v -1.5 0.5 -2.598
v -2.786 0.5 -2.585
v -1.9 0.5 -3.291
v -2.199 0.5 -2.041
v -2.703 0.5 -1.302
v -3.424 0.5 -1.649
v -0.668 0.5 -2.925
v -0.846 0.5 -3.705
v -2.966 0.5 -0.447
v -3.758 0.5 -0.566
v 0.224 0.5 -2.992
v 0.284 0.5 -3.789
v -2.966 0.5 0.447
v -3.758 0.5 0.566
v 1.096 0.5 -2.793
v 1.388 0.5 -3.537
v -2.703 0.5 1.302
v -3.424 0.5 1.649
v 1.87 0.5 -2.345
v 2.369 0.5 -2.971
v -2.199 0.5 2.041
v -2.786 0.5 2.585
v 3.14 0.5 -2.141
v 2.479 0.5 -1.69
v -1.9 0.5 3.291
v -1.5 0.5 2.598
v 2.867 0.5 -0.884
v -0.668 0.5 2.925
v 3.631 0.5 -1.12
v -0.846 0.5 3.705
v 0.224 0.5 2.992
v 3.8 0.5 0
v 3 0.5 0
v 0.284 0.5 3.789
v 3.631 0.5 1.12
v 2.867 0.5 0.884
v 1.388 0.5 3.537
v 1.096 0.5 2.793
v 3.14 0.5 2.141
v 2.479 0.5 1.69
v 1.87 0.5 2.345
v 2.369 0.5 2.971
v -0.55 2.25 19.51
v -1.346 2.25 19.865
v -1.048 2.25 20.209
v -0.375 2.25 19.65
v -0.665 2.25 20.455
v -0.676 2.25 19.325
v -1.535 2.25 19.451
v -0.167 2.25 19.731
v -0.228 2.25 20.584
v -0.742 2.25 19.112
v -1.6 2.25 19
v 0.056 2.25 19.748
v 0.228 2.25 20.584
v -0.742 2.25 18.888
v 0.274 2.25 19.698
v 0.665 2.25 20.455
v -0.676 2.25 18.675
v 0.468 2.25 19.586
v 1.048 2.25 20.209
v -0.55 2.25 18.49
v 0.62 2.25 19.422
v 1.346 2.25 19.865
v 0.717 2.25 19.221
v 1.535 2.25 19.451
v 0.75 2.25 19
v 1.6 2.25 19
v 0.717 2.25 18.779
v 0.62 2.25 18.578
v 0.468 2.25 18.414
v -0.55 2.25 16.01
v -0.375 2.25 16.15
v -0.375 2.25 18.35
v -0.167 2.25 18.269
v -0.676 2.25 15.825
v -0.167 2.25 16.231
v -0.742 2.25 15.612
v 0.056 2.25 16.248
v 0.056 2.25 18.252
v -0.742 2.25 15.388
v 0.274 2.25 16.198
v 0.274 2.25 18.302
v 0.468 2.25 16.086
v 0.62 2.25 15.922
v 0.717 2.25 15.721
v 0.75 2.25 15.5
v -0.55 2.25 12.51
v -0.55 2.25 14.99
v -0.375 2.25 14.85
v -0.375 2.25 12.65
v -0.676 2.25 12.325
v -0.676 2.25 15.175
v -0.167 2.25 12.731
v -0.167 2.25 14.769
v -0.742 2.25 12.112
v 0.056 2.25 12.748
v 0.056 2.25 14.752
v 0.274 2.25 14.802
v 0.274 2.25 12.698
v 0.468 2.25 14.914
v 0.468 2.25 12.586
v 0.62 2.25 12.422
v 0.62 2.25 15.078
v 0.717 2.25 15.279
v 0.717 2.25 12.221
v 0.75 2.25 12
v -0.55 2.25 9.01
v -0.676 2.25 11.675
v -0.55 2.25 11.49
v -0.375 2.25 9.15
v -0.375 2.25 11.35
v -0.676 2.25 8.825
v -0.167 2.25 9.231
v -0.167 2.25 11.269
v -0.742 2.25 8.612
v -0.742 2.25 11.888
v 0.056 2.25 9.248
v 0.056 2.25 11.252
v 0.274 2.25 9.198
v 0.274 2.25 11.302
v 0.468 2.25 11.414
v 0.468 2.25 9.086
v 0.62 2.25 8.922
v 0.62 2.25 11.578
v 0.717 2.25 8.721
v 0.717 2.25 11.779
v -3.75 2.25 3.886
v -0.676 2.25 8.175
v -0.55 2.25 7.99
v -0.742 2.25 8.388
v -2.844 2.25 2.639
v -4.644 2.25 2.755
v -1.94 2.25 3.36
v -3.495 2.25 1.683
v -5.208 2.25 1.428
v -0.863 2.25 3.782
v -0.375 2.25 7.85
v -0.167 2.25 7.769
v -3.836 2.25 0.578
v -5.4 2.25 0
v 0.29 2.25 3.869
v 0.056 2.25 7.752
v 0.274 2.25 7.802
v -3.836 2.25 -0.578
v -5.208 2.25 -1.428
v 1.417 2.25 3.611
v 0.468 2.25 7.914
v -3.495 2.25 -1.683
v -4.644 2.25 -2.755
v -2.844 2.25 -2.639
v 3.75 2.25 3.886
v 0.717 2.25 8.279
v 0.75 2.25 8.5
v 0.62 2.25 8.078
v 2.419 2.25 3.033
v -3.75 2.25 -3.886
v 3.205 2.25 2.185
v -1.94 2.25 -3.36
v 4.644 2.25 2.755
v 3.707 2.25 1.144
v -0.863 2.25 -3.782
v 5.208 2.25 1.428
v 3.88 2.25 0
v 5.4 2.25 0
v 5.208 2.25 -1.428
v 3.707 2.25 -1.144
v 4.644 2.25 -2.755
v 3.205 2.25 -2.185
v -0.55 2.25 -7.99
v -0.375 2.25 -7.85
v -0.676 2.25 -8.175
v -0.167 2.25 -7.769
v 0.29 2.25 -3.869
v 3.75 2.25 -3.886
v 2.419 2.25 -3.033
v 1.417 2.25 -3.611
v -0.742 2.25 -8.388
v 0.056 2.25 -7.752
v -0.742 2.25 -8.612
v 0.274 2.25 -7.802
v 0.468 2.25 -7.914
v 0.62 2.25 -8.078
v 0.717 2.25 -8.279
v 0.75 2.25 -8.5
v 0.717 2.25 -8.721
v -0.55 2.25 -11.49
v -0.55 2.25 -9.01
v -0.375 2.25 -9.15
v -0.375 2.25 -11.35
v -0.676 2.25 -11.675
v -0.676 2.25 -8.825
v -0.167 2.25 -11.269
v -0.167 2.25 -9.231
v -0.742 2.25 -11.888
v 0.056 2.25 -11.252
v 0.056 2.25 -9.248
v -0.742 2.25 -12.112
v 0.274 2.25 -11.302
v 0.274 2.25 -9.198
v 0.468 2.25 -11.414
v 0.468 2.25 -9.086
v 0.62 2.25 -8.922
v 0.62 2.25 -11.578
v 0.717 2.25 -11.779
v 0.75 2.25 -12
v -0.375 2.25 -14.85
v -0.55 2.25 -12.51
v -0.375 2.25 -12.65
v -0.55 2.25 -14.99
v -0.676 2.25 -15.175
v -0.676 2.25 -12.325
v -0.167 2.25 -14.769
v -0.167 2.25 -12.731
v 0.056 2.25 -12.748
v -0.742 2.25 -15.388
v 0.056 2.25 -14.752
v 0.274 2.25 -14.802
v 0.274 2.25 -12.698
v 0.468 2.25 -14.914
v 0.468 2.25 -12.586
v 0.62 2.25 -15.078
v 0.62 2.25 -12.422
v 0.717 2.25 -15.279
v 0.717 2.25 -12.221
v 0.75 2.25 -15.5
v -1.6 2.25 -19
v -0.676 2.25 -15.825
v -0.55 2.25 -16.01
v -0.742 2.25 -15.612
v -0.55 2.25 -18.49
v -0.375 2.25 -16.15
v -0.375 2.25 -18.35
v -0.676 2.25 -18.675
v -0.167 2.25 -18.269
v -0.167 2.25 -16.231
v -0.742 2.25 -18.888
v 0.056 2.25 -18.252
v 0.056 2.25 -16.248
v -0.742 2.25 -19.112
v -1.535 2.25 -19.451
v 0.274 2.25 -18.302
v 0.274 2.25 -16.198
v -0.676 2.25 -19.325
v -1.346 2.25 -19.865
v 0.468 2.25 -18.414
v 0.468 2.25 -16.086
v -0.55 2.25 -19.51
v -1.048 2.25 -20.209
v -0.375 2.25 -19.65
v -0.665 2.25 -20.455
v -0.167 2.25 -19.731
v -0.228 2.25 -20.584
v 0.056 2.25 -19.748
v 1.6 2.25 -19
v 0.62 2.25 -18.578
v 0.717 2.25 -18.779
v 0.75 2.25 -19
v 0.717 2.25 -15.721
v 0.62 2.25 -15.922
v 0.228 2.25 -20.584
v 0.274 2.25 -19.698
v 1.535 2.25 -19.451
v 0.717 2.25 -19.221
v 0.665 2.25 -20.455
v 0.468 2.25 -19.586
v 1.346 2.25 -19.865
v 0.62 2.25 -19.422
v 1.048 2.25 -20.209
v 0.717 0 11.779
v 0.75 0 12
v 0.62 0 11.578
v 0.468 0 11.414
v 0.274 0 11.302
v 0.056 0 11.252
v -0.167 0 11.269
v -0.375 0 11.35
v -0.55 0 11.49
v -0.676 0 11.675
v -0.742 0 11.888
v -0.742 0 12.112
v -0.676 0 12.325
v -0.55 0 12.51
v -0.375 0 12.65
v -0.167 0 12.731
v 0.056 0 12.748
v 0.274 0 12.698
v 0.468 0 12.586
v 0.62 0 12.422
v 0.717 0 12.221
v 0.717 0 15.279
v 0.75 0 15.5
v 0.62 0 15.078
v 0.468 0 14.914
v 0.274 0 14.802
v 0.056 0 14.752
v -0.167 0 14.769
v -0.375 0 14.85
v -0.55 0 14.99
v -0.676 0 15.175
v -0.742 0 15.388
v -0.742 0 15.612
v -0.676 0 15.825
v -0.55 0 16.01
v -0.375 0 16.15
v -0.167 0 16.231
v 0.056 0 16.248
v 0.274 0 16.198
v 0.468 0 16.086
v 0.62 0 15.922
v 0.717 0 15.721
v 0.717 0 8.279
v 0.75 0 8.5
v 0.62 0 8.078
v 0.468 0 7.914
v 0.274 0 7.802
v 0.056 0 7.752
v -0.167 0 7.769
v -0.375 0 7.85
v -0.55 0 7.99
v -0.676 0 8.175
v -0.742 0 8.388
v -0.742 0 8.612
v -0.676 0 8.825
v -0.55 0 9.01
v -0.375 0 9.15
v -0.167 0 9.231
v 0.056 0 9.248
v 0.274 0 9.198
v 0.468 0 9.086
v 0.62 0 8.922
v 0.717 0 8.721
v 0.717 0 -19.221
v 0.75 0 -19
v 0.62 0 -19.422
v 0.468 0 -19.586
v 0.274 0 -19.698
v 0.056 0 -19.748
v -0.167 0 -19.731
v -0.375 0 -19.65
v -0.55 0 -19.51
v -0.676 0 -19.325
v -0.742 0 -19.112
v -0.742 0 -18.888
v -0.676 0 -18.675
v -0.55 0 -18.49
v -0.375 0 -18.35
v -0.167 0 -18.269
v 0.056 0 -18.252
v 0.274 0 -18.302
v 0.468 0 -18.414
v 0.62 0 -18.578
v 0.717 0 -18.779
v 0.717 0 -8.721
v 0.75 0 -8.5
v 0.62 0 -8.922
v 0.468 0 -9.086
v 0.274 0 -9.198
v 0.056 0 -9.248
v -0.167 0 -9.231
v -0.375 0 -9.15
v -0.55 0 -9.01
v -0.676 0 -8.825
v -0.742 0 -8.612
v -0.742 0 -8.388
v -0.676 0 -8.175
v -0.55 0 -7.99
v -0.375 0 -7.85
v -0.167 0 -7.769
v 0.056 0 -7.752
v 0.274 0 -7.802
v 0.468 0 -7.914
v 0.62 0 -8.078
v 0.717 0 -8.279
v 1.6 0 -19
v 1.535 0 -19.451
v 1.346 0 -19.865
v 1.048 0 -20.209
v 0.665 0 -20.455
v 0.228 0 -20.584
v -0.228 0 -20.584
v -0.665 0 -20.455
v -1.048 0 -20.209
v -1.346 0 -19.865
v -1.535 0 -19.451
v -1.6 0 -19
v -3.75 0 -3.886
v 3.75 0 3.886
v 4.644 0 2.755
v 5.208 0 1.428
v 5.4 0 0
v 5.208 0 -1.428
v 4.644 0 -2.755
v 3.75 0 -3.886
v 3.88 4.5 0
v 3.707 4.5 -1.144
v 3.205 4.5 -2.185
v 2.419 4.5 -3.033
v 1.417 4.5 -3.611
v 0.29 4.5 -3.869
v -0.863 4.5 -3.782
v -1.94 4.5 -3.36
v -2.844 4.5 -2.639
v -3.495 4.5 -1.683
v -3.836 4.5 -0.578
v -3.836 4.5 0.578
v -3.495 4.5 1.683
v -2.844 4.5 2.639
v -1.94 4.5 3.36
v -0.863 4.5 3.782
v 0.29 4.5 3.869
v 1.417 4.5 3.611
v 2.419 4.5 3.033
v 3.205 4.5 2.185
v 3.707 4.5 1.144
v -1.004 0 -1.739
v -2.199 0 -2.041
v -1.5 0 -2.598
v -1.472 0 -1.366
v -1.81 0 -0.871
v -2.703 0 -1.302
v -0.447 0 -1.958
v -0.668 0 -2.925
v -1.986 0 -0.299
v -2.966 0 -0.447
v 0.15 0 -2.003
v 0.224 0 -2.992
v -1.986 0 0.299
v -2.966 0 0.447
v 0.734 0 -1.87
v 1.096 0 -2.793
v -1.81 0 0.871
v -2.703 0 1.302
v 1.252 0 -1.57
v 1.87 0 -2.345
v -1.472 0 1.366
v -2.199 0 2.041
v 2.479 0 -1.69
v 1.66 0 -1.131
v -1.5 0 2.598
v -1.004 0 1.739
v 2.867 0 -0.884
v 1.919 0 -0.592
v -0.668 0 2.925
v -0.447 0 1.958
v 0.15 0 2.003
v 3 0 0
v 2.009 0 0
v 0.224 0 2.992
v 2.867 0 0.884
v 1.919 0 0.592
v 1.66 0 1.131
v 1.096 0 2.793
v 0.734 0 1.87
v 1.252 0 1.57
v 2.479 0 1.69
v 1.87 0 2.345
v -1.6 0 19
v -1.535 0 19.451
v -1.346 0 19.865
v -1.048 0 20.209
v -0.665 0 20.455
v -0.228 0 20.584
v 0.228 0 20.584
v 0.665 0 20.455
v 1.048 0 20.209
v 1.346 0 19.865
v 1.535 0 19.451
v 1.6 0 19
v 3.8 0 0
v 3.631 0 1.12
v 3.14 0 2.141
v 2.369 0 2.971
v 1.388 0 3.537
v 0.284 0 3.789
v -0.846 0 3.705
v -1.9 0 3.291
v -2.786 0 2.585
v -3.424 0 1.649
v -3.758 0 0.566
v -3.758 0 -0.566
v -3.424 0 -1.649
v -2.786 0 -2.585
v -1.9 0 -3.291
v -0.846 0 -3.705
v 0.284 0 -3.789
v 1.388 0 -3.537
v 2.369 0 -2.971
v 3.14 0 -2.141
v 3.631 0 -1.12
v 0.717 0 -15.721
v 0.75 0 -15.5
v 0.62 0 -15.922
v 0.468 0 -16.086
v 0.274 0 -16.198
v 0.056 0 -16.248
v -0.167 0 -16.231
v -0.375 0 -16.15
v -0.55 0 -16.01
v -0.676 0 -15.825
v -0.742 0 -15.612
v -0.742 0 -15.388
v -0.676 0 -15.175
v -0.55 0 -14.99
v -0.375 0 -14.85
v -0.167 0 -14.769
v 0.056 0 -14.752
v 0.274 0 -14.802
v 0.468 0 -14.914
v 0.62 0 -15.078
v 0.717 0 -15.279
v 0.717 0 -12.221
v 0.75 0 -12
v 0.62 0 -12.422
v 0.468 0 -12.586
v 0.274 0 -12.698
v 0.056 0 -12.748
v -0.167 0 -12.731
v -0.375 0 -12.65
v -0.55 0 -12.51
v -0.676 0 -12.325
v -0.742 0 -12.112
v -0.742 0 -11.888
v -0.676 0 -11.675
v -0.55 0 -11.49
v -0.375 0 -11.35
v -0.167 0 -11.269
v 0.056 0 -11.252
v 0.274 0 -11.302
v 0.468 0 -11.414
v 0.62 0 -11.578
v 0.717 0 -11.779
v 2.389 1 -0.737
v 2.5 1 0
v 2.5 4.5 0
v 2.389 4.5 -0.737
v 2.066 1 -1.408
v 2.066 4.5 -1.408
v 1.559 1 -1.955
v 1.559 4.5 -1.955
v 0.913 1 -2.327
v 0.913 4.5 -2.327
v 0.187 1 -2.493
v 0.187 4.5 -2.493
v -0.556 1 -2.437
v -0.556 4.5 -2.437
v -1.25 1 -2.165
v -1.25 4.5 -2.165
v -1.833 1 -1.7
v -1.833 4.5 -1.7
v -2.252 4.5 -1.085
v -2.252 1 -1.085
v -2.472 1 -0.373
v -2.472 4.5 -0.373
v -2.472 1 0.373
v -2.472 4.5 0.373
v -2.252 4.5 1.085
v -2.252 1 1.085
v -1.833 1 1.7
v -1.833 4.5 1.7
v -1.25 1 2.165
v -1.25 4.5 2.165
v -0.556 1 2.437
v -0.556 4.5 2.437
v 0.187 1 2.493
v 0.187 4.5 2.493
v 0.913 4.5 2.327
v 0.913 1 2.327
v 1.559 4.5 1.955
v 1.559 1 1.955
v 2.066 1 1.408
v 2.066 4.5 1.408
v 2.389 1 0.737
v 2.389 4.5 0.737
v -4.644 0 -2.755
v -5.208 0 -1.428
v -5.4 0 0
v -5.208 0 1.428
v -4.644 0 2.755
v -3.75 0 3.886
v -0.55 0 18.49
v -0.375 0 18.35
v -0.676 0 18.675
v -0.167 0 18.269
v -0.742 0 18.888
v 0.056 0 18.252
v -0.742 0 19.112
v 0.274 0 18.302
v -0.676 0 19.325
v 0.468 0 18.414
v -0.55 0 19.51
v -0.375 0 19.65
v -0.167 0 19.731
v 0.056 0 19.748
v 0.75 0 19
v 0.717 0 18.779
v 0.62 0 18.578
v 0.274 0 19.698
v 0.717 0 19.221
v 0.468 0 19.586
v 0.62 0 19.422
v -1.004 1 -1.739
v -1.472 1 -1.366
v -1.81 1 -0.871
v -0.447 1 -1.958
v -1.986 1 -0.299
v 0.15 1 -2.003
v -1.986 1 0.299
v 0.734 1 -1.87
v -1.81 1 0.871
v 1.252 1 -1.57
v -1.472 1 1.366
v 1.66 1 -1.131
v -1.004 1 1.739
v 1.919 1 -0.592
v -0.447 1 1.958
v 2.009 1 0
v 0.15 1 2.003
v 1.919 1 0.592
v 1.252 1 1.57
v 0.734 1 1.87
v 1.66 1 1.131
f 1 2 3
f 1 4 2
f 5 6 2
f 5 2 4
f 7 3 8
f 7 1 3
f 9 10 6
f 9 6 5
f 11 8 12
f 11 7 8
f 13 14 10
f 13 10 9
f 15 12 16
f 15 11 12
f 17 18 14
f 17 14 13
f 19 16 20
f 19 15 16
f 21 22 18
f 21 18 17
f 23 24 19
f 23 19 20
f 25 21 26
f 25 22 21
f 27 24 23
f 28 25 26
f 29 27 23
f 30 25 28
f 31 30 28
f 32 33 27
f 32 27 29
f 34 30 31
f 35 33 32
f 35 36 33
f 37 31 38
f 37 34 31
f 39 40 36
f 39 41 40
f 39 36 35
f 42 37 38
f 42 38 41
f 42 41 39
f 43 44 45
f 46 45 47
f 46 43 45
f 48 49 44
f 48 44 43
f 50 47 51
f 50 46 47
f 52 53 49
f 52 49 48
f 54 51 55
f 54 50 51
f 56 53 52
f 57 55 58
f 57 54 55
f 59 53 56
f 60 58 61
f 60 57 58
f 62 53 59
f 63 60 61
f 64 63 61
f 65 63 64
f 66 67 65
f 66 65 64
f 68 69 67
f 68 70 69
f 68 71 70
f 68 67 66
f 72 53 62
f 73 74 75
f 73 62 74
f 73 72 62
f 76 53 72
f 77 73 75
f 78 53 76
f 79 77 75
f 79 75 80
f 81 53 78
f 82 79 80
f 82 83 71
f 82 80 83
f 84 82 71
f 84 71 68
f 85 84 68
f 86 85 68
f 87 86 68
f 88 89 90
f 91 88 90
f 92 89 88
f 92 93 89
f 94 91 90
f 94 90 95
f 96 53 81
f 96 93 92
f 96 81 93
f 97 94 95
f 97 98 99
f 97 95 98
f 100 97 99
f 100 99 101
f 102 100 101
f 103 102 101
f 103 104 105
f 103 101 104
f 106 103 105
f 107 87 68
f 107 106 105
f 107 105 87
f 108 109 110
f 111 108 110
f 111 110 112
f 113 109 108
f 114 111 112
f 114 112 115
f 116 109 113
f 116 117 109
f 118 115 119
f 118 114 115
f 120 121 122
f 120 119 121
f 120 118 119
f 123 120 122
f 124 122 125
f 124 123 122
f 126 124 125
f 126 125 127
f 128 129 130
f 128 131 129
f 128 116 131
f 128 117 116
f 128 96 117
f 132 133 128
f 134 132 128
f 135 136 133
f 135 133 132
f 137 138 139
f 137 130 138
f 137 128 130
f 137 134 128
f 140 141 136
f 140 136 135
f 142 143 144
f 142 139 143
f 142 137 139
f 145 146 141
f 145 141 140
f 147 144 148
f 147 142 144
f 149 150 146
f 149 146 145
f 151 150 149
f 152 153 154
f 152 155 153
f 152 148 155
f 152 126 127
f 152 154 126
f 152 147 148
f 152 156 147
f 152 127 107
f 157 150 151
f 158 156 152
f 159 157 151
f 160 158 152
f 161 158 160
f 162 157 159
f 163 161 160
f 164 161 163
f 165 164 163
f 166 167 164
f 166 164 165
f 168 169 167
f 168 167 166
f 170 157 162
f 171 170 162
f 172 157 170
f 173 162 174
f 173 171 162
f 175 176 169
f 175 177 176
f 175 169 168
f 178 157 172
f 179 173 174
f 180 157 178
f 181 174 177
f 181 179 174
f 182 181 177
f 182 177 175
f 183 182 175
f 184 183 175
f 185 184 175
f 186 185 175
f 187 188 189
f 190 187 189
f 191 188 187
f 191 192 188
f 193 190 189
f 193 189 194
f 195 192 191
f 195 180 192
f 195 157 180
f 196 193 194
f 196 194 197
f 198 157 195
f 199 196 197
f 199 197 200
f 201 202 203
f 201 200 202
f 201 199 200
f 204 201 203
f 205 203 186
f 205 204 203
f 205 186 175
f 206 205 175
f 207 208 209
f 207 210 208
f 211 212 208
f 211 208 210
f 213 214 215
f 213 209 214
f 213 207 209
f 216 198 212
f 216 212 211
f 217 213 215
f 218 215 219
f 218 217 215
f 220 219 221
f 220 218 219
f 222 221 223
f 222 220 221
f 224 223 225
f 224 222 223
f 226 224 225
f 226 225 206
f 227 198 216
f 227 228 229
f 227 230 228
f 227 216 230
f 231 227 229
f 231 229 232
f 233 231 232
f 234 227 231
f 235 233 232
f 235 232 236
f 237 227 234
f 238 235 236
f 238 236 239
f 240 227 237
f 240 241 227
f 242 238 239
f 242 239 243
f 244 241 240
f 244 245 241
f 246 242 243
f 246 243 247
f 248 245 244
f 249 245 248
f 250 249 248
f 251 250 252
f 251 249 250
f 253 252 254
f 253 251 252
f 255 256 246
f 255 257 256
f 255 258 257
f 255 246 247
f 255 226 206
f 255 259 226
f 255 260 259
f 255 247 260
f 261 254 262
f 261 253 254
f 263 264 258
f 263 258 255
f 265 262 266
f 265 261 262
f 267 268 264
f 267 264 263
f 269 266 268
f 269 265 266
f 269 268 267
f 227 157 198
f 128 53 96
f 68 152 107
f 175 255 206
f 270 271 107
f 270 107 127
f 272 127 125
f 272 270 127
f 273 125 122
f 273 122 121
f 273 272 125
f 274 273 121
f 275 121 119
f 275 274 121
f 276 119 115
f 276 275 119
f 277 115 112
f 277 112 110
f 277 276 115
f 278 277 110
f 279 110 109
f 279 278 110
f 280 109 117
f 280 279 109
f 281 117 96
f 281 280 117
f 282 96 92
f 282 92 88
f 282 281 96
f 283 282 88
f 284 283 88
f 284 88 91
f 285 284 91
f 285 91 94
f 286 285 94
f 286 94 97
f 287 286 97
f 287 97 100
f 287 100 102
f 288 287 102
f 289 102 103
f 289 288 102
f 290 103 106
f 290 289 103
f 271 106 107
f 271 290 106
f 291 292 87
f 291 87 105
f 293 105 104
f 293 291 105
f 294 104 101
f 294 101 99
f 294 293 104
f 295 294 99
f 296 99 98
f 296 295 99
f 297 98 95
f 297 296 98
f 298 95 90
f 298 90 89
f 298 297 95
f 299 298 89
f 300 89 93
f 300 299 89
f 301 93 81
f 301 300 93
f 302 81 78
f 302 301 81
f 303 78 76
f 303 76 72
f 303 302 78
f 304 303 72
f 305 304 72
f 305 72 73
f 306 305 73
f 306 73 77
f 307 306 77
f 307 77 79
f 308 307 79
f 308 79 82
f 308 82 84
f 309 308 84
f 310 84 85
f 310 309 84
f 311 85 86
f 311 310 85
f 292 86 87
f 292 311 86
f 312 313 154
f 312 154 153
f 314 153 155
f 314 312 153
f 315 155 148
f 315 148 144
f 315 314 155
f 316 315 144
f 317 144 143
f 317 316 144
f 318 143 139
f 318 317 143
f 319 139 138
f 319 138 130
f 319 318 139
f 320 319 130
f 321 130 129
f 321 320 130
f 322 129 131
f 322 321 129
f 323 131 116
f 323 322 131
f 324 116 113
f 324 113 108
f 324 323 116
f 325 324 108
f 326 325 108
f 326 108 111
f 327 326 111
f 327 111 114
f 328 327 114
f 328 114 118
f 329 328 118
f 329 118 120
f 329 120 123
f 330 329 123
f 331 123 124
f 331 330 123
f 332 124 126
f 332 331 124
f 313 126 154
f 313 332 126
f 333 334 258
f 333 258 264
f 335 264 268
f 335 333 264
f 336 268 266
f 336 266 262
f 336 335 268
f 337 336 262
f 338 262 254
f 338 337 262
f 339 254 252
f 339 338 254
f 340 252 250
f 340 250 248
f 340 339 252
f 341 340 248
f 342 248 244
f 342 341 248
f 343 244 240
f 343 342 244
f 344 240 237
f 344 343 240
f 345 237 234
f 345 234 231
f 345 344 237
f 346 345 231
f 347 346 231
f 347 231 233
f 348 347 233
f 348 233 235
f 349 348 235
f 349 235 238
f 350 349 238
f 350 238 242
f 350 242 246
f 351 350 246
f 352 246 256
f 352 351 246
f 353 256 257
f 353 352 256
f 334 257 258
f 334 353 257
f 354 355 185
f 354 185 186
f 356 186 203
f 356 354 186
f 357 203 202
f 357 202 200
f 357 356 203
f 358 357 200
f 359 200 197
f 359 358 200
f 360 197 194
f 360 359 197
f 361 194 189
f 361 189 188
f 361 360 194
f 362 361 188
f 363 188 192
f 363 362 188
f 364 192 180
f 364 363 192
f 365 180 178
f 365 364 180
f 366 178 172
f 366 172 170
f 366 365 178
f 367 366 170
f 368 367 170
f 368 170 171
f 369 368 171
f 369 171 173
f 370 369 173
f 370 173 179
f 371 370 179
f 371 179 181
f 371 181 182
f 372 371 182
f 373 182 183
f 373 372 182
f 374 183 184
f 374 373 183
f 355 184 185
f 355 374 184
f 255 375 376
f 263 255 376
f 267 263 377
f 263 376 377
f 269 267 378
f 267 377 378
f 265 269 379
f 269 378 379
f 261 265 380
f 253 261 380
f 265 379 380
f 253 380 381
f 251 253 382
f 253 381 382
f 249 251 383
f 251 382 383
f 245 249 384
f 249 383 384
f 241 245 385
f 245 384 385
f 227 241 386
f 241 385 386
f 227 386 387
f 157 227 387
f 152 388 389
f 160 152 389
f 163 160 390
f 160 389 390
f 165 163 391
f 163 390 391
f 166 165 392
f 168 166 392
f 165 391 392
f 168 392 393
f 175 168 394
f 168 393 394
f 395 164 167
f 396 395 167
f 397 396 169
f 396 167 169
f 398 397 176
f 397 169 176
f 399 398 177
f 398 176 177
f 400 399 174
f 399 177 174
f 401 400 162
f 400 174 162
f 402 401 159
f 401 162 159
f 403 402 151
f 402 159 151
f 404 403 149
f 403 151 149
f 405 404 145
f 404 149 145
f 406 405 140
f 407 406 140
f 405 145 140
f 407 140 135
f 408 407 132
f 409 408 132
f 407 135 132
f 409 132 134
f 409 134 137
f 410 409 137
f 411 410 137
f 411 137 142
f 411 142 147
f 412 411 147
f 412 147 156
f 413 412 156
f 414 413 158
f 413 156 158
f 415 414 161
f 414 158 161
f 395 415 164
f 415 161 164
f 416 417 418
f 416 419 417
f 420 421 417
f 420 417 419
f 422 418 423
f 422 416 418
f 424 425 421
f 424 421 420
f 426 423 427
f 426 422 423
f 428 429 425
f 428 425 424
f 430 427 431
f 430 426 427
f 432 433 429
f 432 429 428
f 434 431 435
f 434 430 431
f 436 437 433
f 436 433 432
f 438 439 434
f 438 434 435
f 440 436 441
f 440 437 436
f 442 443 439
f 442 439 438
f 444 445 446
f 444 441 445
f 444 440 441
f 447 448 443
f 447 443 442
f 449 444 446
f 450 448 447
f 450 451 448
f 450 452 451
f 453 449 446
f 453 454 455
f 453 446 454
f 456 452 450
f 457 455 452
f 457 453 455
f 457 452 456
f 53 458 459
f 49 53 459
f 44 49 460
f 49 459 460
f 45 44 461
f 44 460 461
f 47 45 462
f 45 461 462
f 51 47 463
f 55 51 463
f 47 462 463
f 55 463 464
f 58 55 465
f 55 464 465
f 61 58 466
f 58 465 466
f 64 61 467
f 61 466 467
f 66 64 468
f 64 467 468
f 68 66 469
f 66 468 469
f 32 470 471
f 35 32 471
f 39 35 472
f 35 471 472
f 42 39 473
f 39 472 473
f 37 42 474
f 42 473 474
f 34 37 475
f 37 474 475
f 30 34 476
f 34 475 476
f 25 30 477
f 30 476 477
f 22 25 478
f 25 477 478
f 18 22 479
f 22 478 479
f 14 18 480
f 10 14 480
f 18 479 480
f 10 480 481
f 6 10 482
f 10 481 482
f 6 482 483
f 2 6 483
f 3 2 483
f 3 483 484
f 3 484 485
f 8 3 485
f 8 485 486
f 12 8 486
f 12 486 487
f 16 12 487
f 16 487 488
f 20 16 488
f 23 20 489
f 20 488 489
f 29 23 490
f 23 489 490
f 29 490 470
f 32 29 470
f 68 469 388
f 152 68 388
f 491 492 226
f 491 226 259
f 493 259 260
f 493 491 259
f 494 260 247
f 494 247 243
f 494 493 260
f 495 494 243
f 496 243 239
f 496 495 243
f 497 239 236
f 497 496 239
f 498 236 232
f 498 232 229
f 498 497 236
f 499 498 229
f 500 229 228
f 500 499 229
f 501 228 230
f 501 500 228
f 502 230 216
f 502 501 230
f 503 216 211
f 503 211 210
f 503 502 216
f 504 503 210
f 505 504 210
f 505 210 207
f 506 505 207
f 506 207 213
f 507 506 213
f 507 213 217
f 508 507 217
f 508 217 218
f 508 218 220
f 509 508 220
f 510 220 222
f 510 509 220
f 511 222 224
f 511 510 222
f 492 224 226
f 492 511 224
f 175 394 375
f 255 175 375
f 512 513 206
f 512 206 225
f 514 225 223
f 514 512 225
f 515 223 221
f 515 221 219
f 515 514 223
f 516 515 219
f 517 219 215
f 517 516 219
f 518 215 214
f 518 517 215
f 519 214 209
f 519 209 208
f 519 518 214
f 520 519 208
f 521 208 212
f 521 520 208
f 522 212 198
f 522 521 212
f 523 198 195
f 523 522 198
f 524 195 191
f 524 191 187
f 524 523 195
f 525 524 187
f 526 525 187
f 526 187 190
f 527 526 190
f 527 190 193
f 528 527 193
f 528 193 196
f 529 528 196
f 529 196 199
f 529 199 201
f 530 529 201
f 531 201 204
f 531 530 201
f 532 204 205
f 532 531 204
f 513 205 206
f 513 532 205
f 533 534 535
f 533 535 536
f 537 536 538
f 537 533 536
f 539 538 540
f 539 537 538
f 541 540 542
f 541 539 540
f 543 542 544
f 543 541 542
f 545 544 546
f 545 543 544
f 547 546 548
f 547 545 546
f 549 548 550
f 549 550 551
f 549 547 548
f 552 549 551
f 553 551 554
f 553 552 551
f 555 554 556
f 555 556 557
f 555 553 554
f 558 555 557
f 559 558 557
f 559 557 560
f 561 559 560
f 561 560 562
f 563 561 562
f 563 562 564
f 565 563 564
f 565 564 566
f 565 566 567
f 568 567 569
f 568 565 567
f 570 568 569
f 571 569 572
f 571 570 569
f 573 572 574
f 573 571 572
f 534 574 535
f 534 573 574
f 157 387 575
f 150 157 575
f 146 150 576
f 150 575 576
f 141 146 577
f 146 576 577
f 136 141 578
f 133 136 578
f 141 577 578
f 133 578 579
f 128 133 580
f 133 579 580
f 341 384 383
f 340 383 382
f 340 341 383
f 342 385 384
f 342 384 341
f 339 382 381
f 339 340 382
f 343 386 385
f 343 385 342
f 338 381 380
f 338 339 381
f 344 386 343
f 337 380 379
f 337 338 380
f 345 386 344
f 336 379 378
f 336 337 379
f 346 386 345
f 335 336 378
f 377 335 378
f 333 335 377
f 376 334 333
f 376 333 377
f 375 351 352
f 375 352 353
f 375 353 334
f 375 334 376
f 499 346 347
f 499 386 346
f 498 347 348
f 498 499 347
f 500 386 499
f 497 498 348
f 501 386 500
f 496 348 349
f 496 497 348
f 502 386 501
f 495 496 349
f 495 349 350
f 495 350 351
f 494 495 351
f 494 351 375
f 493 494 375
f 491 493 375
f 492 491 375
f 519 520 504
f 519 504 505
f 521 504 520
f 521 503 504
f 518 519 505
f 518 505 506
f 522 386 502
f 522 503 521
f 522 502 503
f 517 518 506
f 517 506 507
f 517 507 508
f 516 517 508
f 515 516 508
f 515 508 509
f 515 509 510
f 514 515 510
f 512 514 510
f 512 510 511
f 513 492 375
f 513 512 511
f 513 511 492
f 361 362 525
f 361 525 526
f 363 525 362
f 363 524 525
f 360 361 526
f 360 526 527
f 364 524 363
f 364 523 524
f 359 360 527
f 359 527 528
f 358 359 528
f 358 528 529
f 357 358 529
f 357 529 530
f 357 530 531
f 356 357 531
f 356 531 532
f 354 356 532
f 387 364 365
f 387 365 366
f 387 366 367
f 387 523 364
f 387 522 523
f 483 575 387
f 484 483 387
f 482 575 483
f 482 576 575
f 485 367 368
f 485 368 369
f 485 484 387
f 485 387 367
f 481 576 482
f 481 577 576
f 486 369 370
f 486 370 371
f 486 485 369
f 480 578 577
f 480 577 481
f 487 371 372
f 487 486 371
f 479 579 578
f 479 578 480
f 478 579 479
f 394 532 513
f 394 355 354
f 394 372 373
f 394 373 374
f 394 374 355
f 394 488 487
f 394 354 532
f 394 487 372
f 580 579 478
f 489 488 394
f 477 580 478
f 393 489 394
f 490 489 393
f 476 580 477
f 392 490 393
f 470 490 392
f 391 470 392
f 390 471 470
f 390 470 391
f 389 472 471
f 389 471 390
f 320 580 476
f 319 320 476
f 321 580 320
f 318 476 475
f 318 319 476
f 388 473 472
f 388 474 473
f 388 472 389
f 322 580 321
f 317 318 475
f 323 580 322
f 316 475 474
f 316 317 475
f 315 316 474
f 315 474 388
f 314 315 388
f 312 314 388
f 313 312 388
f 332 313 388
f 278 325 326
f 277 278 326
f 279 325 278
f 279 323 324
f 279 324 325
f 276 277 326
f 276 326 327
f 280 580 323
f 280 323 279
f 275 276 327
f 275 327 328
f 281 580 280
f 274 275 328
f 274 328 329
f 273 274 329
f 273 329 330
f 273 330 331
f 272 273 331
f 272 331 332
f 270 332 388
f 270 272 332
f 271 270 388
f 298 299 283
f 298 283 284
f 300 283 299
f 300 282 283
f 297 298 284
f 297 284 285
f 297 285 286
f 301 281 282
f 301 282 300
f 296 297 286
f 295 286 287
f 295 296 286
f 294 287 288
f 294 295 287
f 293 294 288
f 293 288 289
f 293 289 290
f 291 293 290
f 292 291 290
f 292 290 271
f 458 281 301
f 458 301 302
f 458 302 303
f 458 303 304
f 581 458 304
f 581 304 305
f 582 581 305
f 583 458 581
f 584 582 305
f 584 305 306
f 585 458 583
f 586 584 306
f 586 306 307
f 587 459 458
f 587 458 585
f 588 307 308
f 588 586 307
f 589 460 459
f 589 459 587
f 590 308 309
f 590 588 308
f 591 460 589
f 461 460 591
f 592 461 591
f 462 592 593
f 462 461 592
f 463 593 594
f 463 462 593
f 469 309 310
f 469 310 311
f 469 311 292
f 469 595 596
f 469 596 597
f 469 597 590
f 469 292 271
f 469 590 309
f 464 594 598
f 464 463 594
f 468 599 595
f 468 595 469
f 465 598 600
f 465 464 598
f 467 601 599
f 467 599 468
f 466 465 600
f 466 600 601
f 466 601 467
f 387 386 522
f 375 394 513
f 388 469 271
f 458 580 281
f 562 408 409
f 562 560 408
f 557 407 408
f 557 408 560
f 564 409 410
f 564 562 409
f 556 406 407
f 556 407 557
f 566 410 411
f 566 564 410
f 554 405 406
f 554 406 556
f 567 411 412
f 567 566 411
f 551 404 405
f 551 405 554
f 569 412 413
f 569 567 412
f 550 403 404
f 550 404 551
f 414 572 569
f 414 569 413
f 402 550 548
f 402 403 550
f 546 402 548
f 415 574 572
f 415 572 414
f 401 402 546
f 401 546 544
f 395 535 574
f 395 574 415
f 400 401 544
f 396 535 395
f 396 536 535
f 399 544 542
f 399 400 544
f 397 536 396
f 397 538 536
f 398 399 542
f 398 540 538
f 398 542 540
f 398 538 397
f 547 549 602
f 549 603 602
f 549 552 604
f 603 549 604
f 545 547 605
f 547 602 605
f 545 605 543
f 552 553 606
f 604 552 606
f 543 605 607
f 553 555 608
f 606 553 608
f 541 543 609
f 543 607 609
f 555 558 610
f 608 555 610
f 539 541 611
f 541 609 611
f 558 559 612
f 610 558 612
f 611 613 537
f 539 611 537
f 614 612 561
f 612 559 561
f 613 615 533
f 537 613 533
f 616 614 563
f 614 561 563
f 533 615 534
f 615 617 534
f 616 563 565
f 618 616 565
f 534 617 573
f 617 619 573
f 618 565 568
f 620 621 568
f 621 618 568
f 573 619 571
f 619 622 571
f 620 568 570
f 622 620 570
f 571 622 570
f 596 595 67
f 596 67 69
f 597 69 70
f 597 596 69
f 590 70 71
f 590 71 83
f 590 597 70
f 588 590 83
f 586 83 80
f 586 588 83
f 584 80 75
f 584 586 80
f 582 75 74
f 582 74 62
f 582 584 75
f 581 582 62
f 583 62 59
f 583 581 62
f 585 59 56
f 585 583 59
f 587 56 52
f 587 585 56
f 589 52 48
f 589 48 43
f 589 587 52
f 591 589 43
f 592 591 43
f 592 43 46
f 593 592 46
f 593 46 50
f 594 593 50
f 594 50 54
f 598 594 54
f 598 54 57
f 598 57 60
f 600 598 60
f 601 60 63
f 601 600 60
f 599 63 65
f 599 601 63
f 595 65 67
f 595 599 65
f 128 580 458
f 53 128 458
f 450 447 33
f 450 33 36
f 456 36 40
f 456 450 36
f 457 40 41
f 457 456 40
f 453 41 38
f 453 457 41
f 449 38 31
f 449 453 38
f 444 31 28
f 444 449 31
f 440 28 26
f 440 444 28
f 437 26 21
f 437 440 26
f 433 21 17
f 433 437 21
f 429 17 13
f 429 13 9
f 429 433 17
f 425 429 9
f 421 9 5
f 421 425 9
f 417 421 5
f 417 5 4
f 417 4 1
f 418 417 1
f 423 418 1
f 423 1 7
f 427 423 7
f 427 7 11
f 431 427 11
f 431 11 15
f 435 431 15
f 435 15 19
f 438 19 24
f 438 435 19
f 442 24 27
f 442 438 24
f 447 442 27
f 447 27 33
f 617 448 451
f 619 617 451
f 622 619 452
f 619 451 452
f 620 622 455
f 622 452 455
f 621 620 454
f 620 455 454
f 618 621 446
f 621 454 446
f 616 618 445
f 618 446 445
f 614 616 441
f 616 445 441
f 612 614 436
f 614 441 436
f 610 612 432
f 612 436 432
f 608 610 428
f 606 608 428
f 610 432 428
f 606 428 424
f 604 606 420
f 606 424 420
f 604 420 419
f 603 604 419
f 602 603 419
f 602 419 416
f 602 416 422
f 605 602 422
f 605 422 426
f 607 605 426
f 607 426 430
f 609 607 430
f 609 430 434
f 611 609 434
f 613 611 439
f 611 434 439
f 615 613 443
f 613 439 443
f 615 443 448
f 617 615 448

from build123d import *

# Parameters (mm, degrees)
SKETCH1_R           = 2.5
SKETCH1_R_2         = 0.75
BOSS_EXTRUDE1_DEPTH = 2.25
SKETCH2_R           = 3.879501895
SKETCH2_R_2         = 2.5
BOSS_EXTRUDE2_DEPTH = 2.25
SKETCH3_R           = 2.5
SKETCH3_R_2         = 2.008527967
BOSS_EXTRUDE3_DEPTH = 1
SKETCH4_R           = 3.8
SKETCH4_R_2         = 3
CUT_EXTRUDE1_DEPTH  = 0.5


with BuildPart() as part:
    # Sketch1 → Boss-Extrude1 (new body)
    with BuildSketch(Plane(origin=(0, 0, 0), x_dir=(1, 0, 0), z_dir=(0, 1, 0))):
        with BuildLine():
            Line((-1.6, 19), (-3.75, 3.885550154))
            ThreePointArc((-3.75, 3.885550154), (-5.4, 0), (-3.75, -3.885550154))
            Line((-3.75, -3.885550154), (-1.6, -19))
            ThreePointArc((-1.6, -19), (0, -20.6), (1.6, -19))
            Line((1.6, -19), (3.75, -3.885550154))
            ThreePointArc((3.75, -3.885550154), (5.4, 0), (3.75, 3.885550154))
            Line((3.75, 3.885550154), (1.6, 19))
            ThreePointArc((1.6, 19), (0, 20.6), (-1.6, 19))
        make_face()
        Circle(SKETCH1_R, mode=Mode.SUBTRACT)
        with Locations((0, -19)):
            Circle(SKETCH1_R_2, mode=Mode.SUBTRACT)
        with Locations((0, 19)):
            Circle(SKETCH1_R_2, mode=Mode.SUBTRACT)
        with Locations((0, 15.5)):
            Circle(SKETCH1_R_2, mode=Mode.SUBTRACT)
        with Locations((0, 12)):
            Circle(SKETCH1_R_2, mode=Mode.SUBTRACT)
        with Locations((0, 8.5)):
            Circle(SKETCH1_R_2, mode=Mode.SUBTRACT)
        with Locations((0, -15.5)):
            Circle(SKETCH1_R_2, mode=Mode.SUBTRACT)
        with Locations((0, -12)):
            Circle(SKETCH1_R_2, mode=Mode.SUBTRACT)
        with Locations((0, -8.5)):
            Circle(SKETCH1_R_2, mode=Mode.SUBTRACT)
    extrude(amount=BOSS_EXTRUDE1_DEPTH)

    # Sketch2 → Boss-Extrude2 (add)
    with BuildSketch(Plane(origin=(0, 2.25, 0), x_dir=(1, 0, 0), z_dir=(0, 1, 0))):
        Circle(SKETCH2_R)
        Circle(SKETCH2_R_2, mode=Mode.SUBTRACT)
    extrude(amount=BOSS_EXTRUDE2_DEPTH)

    # Sketch3 → Boss-Extrude3 (add)
    with BuildSketch(Plane.XZ):
        Circle(SKETCH3_R)
        Circle(SKETCH3_R_2, mode=Mode.SUBTRACT)
    extrude(amount=-BOSS_EXTRUDE3_DEPTH)

    # Sketch4 → Cut-Extrude1 (cut)
    with BuildSketch(Plane.XZ):
        Circle(SKETCH4_R)
        Circle(SKETCH4_R_2, mode=Mode.SUBTRACT)
    extrude(amount=-CUT_EXTRUDE1_DEPTH, mode=Mode.SUBTRACT)


solid = part.part
